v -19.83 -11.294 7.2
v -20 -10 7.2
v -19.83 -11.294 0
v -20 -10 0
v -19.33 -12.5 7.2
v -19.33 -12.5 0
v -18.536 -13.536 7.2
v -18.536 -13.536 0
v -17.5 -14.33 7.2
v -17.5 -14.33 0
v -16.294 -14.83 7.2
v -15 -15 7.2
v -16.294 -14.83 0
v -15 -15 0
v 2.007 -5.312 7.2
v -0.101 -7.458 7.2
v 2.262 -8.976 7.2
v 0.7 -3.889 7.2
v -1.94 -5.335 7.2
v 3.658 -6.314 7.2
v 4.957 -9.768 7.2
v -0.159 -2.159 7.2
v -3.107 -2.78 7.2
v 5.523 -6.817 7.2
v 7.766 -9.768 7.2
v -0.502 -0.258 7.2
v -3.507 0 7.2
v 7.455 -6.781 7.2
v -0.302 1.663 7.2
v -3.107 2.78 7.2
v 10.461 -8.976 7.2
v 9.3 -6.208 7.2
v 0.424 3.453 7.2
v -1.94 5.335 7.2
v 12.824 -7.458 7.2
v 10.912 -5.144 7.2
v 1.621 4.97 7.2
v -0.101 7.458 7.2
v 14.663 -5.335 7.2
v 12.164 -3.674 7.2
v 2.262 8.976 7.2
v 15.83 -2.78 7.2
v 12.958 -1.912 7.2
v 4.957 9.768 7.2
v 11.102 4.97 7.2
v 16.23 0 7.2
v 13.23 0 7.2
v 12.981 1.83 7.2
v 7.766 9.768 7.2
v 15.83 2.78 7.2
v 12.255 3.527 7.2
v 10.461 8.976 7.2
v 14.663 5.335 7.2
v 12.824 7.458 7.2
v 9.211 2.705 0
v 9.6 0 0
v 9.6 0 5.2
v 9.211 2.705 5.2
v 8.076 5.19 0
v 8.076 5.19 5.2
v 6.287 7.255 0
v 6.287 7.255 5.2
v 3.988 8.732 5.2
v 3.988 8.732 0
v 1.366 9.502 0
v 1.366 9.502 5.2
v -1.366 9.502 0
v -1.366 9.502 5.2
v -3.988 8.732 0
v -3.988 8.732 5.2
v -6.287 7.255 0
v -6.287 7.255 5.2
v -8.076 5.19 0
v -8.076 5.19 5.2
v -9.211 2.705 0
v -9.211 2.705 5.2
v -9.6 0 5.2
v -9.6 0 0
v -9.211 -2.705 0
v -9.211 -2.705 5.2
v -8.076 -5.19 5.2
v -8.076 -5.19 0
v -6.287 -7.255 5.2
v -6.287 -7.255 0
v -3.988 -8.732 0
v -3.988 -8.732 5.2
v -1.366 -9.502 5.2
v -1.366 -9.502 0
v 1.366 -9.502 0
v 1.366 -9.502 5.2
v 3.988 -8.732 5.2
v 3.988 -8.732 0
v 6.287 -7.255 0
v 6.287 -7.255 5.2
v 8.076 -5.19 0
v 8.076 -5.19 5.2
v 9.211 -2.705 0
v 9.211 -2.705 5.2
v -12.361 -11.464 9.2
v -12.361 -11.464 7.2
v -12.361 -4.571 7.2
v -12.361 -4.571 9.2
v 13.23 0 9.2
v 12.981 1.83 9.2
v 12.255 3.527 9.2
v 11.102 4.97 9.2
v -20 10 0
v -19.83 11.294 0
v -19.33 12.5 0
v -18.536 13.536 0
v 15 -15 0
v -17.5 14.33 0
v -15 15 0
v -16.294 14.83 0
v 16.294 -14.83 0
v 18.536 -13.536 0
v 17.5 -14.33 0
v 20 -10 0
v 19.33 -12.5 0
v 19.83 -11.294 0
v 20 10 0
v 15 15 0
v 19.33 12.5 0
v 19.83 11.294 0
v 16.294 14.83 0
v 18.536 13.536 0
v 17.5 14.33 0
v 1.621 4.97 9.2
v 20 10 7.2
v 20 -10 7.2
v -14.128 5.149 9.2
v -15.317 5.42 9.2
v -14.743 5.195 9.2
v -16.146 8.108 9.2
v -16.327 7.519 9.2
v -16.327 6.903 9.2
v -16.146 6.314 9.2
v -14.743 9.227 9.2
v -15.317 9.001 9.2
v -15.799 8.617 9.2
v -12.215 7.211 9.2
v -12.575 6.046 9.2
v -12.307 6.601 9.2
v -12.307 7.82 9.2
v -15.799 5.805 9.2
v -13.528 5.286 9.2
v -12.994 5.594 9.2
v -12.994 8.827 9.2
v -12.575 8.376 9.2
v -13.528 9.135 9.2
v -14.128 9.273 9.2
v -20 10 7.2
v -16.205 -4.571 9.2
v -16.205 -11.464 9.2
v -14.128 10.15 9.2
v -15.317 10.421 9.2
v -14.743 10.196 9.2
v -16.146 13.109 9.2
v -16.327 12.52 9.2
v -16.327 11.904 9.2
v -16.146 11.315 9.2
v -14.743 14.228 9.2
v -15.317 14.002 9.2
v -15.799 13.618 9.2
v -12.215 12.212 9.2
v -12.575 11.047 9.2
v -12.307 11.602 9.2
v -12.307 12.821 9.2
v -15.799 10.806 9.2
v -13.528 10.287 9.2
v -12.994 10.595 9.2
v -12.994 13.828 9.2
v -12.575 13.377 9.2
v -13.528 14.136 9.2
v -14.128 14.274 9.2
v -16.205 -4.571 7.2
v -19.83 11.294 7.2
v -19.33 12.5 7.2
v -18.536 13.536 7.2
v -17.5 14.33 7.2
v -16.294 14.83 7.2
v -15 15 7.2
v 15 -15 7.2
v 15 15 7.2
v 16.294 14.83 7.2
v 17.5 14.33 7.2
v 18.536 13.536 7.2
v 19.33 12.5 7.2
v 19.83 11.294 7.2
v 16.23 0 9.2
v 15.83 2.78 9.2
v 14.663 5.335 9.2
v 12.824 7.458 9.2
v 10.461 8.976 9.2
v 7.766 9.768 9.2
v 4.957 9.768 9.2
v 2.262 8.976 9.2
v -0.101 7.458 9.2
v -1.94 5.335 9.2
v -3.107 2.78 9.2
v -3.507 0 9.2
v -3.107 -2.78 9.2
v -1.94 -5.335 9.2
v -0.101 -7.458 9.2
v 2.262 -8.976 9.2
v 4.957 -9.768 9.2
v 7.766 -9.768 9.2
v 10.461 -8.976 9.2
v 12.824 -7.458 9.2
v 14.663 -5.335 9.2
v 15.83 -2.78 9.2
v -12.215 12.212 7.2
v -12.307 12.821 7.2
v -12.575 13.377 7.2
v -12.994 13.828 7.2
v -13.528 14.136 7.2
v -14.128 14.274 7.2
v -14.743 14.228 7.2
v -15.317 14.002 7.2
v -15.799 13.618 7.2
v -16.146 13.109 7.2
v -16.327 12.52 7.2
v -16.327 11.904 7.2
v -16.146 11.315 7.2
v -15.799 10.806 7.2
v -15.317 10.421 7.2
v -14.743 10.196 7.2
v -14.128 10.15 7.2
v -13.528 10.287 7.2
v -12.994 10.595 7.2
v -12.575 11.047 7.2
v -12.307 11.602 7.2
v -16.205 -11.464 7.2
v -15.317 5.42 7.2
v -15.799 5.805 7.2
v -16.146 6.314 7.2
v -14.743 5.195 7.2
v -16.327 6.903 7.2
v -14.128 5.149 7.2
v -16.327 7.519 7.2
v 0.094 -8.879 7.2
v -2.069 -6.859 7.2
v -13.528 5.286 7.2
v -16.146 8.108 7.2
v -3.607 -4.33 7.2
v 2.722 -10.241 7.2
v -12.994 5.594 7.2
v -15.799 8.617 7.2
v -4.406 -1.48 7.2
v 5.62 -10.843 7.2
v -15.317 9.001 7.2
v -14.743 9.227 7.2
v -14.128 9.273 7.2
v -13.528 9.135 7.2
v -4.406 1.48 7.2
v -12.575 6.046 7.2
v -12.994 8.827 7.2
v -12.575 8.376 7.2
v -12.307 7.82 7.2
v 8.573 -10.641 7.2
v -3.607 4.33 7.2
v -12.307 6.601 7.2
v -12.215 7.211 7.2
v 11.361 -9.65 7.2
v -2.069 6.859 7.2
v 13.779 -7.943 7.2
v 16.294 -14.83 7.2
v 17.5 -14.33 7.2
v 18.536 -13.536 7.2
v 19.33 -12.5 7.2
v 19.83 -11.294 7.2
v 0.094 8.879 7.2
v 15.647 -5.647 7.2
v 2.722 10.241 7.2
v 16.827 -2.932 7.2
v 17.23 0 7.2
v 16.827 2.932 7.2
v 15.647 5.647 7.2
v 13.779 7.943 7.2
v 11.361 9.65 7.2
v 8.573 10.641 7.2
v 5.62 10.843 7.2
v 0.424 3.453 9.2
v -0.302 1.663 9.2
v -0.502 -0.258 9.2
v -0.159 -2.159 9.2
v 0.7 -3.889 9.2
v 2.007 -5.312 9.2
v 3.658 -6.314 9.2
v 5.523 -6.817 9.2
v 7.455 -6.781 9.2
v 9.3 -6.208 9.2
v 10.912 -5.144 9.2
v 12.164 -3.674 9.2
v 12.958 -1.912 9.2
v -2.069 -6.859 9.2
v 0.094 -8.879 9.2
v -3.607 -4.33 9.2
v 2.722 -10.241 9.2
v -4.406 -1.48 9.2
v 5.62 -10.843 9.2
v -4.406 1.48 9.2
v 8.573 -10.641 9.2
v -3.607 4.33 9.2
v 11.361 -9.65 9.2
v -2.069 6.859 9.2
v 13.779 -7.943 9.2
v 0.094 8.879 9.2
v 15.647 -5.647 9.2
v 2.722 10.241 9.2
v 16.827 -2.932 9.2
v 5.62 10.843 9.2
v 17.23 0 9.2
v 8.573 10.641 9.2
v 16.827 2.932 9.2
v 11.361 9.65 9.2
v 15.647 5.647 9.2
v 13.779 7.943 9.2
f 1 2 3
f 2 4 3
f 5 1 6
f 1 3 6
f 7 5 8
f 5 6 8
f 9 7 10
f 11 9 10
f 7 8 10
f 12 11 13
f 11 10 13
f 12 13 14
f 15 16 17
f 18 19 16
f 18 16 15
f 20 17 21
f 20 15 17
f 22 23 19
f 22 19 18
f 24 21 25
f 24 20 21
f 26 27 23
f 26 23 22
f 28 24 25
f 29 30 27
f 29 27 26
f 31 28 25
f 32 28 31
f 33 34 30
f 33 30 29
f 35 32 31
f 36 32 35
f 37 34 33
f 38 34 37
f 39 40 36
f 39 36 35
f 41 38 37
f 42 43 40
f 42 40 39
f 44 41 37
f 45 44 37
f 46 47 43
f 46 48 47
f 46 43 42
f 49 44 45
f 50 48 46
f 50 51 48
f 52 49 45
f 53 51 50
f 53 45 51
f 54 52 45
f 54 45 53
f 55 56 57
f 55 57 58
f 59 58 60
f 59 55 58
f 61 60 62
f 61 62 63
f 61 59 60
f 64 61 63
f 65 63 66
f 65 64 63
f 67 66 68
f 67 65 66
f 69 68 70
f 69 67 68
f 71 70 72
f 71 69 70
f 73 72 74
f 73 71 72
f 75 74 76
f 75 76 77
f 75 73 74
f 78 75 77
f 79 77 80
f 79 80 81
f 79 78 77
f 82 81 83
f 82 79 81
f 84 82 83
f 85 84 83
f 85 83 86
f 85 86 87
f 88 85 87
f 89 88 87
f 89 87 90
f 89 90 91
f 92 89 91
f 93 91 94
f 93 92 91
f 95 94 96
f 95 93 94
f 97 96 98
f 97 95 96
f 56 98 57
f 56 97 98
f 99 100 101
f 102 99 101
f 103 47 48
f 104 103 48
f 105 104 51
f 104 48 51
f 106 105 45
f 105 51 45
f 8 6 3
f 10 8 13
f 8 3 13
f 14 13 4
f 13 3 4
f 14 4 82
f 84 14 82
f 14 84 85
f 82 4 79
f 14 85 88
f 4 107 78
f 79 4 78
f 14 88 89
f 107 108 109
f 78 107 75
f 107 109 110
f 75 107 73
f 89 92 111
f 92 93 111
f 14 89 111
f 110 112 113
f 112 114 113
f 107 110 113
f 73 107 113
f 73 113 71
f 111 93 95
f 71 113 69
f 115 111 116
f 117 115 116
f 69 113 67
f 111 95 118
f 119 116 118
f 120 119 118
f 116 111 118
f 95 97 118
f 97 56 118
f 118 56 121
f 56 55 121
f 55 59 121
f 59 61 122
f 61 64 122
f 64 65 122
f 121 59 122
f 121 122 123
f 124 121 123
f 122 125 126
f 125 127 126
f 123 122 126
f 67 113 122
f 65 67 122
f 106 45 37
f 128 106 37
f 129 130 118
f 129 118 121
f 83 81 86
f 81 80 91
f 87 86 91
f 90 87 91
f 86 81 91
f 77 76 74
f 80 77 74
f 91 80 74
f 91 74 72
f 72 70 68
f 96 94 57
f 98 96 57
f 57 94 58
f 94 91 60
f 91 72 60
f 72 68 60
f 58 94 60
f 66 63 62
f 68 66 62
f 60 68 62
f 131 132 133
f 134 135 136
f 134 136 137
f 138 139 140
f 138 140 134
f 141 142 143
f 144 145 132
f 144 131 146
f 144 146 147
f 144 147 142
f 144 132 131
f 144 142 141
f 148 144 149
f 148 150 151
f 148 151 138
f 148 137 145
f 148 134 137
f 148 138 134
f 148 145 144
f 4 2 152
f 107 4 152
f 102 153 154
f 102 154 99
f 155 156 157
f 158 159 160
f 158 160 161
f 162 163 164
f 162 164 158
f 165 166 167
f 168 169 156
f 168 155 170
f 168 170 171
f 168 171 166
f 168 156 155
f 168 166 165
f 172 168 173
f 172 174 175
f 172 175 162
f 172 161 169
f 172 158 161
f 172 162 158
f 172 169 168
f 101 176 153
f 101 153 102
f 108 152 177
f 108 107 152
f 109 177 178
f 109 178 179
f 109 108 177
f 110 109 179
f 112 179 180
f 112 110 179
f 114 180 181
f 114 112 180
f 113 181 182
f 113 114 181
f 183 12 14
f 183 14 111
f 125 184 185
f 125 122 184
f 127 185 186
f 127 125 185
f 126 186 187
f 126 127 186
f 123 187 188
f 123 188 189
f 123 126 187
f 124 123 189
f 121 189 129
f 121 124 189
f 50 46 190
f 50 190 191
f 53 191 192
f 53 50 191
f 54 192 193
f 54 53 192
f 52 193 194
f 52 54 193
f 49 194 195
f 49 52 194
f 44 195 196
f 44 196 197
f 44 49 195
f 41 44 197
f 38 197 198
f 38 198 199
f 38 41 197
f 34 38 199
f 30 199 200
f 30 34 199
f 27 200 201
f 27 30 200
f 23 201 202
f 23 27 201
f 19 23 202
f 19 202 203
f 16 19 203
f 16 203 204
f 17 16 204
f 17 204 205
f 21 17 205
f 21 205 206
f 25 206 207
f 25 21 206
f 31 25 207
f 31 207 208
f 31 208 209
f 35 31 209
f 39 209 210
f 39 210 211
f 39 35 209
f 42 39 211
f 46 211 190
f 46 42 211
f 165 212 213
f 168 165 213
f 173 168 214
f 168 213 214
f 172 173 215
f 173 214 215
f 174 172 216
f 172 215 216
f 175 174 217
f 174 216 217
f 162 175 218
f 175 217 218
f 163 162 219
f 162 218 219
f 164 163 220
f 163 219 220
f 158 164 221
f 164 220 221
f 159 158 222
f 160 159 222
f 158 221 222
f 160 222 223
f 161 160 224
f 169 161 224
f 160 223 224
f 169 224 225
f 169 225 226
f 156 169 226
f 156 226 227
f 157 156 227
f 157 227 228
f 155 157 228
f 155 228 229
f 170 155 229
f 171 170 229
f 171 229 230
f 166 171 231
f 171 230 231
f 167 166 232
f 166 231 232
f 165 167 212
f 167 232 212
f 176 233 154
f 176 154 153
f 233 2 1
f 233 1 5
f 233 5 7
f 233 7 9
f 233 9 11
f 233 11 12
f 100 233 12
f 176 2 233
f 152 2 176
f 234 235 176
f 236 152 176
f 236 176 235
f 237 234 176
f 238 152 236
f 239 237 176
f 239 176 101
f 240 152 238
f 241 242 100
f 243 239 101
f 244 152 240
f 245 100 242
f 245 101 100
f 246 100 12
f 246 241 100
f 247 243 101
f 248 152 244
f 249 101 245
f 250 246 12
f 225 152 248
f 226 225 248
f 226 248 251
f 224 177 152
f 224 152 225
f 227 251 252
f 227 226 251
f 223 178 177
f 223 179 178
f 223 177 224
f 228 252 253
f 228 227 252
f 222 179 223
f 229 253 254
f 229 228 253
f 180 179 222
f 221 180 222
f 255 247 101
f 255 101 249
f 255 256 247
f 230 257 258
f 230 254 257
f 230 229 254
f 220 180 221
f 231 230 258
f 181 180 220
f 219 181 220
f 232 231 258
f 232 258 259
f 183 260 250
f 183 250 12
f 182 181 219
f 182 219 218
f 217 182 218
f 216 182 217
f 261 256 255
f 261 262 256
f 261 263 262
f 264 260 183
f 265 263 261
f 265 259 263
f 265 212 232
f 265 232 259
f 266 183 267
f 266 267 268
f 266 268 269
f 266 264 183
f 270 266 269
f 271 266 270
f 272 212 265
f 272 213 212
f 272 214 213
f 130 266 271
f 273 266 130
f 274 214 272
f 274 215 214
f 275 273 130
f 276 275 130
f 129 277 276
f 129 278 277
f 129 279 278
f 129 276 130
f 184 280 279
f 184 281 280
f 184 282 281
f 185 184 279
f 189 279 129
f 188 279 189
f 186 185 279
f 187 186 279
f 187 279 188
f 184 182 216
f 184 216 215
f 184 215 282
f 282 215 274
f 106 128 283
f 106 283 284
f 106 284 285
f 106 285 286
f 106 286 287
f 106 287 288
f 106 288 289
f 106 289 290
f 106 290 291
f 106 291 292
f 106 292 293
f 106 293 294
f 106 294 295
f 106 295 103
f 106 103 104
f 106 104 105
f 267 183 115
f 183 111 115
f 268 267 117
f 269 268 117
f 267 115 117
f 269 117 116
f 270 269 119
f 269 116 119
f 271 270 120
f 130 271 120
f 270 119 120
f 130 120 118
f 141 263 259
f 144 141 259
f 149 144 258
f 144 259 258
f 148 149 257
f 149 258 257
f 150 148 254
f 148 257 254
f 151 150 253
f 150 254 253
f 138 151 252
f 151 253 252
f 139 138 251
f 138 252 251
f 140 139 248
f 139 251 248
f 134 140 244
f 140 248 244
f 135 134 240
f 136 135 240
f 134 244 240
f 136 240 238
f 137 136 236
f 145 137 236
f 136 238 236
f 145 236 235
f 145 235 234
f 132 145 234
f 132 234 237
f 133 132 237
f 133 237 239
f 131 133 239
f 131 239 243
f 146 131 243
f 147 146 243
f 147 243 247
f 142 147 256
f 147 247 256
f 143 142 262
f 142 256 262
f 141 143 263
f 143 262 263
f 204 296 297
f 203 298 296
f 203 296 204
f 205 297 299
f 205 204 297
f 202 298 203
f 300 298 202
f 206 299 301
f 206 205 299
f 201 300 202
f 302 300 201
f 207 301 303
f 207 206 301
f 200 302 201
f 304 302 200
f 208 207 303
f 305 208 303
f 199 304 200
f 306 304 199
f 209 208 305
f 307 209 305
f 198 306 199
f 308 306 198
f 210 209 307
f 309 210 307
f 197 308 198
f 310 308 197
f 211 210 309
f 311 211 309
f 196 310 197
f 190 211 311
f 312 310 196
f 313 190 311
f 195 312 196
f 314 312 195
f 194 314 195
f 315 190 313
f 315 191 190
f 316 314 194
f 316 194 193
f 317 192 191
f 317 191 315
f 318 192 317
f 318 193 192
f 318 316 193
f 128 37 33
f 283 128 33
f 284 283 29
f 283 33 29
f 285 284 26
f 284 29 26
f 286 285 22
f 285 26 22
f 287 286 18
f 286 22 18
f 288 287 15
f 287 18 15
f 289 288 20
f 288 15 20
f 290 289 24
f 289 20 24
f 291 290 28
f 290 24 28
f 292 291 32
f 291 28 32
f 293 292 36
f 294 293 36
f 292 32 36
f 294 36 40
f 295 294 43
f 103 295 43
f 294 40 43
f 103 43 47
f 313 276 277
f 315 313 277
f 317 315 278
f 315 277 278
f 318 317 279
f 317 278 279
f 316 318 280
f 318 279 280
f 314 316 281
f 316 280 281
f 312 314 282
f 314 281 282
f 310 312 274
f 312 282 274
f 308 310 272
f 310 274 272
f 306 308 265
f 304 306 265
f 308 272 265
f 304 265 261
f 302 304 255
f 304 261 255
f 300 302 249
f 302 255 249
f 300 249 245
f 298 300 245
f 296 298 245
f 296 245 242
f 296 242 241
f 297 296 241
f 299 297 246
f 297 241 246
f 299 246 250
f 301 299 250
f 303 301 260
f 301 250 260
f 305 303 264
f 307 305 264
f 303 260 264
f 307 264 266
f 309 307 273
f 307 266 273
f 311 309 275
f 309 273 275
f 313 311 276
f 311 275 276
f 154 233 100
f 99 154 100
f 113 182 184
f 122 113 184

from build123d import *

# Parameters (mm, degrees)
F0_R     = 11.6
F0_R_2   = 9.6
F1_DEPTH = 5.2
F2_R     = 11.6
F2_R_2   = 9.6
F3_DEPTH = 2
F4_W     = 40
F4_H     = 30
F4_R     = 11.6
F5_DEPTH = 7.2
F6_R     = 5
F7_R     = 10.8681902922
F7_R_2   = 9.8681902922
F7_W     = 3.8435366005
F7_H     = 6.8932622671
F7_R_3   = 2.0674977133
F8_DEPTH = 2


with BuildPart() as f1:
    # F0 (on Top) → F1 (new body)
    with BuildSketch(Plane.XY):
        Circle(F0_R)
        Circle(F0_R_2, mode=Mode.SUBTRACT)
    extrude(amount=F1_DEPTH)

    # F2 (on face) → F3 (join)
    with BuildSketch(Plane.XY.offset(5.2)):
        Circle(F2_R)
        Circle(F2_R_2, mode=Mode.SUBTRACT)
        Circle(F2_R_2)
    extrude(amount=F3_DEPTH)

    # F4 (on face) → F5 (join)
    with BuildSketch(Plane.XY.offset(7.2)):
        Rectangle(F4_W, F4_H)
        Circle(F4_R, mode=Mode.SUBTRACT)
    extrude(amount=-F5_DEPTH)

    # F6
    f6_edges = [f1.edges().sort_by_distance(p)[0] for p in [
        (-20, -15, 3.6),
        (-20, 15, 3.6),
        (20, -15, 3.6),
        (20, 15, 3.6),
    ]]
    fillet(f6_edges, radius=F6_R)

    # F7 (on face) → F8 (join)
    with BuildSketch(Plane.XY.offset(7.2)):
        with Locations((6.3613462262, 0)):
            Circle(F7_R)
        with Locations((6.3613462262, 0)):
            Circle(F7_R_2, mode=Mode.SUBTRACT)
        with BuildLine():
            ThreePointArc((1.6207129094, 4.9697518697), (3.6583417714, -6.3139373459), (13.2295365184, 0))
            ThreePointArc((13.2295365184, 0), (12.6752835721, 2.7030044548), (11.1019795429, 4.9697518697))
            Line((11.1019795429, 4.9697518697), (1.6207129094, 4.9697518697))
        make_face()
        with Locations((-14.2829688266, -8.0176712945)):
            Rectangle(F7_W, F7_H)
        with Locations((-14.2829688266, 7.2108898312)):
            Circle(F7_R_3)
        with Locations((-14.2829688266, 12.2118974105)):
            Circle(F7_R_3)
    extrude(amount=F8_DEPTH)


solid = f1.part
